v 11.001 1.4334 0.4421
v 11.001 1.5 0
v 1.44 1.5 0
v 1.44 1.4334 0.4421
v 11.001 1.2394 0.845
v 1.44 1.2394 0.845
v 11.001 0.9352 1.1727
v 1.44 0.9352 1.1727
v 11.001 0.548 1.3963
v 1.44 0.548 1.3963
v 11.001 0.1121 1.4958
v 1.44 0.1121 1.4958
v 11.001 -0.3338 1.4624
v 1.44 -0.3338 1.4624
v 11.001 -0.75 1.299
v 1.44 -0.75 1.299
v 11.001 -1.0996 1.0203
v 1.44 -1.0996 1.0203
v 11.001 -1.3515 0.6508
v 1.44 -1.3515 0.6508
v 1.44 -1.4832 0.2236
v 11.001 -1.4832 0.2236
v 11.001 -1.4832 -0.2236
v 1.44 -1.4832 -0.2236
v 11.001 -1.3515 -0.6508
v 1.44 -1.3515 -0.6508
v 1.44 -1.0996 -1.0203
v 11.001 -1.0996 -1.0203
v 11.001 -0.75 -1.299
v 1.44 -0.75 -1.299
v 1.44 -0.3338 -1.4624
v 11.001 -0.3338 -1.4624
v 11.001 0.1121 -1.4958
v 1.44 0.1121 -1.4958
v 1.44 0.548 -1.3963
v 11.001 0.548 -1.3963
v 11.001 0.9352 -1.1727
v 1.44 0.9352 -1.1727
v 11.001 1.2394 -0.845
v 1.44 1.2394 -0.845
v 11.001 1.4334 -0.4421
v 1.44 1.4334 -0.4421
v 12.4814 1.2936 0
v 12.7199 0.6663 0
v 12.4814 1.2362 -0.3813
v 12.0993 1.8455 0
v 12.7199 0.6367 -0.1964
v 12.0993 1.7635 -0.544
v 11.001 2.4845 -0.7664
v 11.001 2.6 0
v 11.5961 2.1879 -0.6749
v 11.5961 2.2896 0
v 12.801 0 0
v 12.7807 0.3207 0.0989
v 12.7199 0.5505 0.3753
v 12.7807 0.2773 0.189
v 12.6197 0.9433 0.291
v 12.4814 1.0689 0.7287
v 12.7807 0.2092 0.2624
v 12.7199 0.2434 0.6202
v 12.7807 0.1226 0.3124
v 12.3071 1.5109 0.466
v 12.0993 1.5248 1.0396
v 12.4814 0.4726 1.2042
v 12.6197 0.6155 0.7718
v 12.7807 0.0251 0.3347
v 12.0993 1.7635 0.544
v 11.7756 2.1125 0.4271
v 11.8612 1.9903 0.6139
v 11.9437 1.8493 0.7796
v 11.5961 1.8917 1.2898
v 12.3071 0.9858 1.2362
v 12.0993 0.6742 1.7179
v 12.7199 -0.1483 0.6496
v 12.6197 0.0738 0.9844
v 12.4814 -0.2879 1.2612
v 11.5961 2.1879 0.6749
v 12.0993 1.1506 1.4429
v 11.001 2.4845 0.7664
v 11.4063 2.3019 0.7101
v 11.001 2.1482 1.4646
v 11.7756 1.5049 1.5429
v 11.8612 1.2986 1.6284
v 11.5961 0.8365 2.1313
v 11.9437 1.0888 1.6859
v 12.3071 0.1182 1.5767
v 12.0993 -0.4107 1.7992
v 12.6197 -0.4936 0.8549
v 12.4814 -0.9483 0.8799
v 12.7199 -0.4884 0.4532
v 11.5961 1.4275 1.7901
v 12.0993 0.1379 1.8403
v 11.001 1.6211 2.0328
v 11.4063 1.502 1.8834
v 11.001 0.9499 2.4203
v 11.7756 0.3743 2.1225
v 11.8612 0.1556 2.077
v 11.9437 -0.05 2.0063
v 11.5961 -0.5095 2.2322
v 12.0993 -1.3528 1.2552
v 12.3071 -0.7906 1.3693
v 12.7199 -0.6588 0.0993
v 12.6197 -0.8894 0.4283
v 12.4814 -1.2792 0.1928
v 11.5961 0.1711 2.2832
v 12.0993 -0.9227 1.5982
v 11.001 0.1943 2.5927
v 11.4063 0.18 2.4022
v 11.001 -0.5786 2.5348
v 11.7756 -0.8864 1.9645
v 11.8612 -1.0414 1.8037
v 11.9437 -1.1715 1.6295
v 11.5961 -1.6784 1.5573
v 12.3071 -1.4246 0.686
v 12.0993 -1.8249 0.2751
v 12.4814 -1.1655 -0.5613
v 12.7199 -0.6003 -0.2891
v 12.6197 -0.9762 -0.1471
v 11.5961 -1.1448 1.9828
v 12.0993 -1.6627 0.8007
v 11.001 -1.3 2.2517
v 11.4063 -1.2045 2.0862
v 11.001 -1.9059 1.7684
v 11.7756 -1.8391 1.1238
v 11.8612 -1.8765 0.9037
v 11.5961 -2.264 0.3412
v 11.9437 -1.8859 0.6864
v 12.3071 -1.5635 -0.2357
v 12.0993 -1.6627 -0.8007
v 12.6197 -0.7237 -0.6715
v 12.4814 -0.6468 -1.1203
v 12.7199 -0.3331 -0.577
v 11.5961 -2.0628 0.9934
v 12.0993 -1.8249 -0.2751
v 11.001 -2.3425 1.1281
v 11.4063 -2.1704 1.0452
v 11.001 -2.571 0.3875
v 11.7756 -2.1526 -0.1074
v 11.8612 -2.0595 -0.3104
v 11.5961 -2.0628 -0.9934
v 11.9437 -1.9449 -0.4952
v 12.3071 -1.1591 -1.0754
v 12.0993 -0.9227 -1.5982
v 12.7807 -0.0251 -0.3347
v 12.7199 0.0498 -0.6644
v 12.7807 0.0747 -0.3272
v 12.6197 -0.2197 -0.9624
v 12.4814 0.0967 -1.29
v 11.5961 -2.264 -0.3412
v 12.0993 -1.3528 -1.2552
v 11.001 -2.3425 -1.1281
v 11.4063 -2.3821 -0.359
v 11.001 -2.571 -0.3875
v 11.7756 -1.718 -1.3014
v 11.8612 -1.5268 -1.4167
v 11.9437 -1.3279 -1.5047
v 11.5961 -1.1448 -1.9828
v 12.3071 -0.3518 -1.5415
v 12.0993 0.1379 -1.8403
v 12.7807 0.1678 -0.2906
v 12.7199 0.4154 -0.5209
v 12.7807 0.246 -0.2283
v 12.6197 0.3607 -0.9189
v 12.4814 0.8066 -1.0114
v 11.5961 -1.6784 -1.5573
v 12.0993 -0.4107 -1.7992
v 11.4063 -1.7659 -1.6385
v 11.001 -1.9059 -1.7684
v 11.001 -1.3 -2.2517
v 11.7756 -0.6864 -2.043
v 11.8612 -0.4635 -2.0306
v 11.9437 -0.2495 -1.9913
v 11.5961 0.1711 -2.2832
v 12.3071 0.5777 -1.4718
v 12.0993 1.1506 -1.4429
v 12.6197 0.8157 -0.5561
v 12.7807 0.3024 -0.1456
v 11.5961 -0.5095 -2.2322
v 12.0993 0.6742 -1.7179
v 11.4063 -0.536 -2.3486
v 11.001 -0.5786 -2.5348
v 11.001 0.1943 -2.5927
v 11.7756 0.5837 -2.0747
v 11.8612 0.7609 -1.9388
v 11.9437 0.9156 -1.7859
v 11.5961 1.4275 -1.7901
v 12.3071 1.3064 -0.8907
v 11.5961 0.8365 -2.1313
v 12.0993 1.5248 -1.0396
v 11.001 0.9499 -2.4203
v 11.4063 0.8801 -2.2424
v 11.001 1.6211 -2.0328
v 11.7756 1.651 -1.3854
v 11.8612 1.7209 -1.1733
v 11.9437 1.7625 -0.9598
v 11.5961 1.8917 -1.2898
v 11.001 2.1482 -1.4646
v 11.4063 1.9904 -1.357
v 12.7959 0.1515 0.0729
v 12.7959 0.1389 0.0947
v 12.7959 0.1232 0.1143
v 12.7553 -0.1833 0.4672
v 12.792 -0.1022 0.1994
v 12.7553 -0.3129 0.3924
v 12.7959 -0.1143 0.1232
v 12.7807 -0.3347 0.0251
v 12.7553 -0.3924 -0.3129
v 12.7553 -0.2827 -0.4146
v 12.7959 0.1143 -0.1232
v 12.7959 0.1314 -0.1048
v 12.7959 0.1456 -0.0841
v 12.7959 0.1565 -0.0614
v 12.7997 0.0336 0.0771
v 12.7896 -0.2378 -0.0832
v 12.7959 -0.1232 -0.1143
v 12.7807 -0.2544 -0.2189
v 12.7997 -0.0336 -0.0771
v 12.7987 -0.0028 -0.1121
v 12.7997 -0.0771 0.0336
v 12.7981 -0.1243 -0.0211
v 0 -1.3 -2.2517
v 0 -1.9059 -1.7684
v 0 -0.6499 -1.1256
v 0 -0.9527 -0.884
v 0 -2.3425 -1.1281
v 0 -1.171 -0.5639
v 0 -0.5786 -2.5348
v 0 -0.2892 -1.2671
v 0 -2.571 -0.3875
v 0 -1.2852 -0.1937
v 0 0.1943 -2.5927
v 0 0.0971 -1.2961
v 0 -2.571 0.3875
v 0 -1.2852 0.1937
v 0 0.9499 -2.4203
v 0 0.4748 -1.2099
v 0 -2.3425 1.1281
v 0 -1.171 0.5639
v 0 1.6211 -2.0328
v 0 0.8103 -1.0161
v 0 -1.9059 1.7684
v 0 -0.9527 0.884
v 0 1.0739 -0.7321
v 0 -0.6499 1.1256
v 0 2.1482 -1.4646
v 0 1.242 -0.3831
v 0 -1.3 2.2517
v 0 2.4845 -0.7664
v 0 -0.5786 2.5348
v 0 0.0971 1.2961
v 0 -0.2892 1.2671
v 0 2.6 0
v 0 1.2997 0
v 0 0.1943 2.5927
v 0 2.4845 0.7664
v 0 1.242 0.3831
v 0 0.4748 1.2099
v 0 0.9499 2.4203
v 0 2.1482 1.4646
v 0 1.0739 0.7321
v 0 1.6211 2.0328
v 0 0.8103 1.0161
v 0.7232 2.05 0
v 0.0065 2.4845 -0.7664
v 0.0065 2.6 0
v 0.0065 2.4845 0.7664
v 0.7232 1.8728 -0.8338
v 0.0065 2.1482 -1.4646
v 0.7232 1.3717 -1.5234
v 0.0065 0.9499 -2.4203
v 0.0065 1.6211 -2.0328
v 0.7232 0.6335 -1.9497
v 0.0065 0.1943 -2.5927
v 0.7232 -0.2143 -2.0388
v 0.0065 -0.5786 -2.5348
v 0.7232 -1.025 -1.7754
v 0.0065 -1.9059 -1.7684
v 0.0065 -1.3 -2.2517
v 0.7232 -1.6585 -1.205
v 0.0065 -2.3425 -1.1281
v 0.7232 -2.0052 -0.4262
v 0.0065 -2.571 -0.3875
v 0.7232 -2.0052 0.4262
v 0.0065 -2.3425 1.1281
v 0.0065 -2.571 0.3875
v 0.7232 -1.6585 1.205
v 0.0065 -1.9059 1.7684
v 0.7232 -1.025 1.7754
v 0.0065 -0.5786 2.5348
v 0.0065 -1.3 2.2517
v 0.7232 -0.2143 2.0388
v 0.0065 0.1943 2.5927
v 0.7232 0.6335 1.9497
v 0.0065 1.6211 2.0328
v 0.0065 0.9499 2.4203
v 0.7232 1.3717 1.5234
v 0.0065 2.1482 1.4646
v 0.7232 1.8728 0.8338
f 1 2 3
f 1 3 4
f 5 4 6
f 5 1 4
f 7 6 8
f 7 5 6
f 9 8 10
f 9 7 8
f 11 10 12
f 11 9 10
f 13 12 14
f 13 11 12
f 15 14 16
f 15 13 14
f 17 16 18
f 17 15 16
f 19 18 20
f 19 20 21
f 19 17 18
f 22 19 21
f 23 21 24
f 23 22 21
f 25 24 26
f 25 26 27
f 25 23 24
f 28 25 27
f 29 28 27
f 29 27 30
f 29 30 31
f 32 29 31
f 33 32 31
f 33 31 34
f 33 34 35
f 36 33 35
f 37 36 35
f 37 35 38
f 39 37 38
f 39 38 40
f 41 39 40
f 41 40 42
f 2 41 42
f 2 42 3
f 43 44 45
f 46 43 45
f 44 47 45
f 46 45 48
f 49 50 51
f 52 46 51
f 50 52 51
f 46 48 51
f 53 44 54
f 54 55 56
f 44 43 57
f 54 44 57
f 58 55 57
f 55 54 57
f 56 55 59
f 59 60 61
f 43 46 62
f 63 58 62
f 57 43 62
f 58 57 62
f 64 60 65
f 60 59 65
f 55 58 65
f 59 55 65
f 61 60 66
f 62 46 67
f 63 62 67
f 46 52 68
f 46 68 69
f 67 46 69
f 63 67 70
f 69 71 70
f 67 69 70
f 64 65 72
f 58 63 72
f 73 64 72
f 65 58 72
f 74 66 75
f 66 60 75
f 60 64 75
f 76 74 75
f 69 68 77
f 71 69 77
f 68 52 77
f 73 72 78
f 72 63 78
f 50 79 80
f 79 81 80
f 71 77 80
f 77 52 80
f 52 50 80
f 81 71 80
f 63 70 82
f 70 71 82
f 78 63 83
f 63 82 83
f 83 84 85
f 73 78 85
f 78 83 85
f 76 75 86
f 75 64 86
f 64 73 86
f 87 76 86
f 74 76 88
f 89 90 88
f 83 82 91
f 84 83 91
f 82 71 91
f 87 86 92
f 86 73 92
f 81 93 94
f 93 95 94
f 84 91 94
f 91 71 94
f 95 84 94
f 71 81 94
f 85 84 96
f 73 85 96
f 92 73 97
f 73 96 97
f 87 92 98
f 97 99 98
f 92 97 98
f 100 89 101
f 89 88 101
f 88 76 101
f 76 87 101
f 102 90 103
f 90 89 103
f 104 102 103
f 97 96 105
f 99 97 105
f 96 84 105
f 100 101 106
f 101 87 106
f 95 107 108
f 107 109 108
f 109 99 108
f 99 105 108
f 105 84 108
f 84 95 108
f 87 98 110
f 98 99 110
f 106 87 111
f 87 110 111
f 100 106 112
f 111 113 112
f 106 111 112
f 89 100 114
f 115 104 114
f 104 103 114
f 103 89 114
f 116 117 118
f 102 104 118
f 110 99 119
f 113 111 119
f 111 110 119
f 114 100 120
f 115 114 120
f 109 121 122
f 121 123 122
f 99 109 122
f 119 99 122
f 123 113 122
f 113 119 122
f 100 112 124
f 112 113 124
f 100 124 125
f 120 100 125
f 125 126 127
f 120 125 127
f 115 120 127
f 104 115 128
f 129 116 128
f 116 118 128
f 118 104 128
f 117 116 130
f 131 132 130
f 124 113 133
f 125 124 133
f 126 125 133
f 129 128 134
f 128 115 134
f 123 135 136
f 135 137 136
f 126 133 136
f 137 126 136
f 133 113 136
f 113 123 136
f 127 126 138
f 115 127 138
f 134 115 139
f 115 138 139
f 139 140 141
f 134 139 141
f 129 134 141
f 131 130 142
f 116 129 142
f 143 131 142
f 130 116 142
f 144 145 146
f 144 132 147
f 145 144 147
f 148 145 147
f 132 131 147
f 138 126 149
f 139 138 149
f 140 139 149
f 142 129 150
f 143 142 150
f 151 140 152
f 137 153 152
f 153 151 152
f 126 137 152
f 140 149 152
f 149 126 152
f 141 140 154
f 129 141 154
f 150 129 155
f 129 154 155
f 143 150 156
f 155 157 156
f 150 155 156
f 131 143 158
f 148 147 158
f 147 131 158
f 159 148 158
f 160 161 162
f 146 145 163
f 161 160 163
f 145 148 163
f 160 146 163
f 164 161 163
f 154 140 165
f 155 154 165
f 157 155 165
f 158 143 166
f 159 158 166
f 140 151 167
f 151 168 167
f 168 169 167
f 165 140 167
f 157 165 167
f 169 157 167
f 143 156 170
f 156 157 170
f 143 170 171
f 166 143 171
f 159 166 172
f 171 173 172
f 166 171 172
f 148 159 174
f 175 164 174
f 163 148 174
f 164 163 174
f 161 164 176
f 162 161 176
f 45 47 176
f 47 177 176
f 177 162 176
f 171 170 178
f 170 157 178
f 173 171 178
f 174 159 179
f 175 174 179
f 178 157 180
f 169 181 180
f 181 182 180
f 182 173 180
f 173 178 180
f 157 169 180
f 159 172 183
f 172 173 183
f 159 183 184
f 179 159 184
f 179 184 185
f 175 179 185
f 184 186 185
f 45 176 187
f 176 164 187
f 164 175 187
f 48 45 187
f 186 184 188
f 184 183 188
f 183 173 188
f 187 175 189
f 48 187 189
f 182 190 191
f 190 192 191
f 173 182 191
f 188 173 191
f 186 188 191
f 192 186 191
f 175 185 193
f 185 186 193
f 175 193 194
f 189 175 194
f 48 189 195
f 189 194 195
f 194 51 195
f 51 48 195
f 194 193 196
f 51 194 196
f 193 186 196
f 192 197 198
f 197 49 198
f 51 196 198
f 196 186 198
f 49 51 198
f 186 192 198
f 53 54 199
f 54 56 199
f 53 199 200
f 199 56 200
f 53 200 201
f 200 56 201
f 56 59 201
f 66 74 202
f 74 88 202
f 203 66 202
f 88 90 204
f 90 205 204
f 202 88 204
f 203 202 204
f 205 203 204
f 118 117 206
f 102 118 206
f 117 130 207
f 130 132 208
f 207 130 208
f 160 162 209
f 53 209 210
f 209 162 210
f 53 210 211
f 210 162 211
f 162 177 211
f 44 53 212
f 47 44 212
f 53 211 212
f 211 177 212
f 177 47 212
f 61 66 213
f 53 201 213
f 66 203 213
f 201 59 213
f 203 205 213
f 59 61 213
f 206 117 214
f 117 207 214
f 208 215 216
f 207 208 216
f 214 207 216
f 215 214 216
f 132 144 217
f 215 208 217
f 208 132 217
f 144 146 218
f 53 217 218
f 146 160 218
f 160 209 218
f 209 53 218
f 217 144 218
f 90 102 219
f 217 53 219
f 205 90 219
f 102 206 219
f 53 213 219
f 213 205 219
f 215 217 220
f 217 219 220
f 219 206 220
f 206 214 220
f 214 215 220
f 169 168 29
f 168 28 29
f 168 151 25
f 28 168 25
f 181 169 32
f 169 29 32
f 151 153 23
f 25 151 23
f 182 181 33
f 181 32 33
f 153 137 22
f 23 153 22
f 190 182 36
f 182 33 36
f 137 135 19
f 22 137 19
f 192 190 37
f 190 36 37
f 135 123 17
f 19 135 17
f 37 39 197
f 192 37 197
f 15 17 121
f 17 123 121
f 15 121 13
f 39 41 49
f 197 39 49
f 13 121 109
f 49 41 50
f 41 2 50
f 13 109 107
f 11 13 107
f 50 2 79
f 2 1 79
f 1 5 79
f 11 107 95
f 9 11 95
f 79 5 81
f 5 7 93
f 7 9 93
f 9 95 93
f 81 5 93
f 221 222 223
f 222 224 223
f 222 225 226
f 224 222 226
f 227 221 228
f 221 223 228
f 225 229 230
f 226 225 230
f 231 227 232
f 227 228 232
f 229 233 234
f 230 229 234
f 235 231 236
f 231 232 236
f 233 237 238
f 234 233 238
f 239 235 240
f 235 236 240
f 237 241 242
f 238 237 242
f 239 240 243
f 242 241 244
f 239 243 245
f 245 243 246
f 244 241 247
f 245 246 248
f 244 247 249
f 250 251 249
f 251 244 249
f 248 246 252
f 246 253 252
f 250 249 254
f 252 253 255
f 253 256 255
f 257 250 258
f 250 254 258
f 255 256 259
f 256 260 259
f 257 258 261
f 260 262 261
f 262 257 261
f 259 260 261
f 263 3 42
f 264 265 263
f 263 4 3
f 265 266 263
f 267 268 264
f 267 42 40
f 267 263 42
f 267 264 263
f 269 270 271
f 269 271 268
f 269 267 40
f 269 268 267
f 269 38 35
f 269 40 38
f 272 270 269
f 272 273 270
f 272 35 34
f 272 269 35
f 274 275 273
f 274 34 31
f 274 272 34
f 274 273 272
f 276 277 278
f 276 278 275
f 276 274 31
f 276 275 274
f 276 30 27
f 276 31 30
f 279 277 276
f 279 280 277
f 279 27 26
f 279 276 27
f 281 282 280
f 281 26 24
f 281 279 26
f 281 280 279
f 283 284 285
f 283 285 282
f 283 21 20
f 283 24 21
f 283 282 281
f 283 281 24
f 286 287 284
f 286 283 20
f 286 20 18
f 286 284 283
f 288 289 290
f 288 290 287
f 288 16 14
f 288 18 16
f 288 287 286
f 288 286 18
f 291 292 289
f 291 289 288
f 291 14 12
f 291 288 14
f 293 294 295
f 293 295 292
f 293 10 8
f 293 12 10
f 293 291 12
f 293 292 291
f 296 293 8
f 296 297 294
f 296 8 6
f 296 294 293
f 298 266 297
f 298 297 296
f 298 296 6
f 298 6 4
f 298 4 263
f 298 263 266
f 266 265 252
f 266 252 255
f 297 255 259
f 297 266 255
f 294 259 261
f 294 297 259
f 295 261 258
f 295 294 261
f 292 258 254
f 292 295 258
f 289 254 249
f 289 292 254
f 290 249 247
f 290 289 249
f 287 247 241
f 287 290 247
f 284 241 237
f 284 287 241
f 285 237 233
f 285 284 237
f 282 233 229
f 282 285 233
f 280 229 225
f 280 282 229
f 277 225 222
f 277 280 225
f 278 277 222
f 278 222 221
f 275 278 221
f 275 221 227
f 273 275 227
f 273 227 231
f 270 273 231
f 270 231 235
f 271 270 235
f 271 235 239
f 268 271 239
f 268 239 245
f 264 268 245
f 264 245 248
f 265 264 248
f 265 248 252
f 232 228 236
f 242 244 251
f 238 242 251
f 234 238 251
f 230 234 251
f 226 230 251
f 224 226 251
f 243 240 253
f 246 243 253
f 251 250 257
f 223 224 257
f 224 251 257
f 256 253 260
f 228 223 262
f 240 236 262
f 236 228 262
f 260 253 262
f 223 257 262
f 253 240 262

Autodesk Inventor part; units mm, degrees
ref_plane "YZ Plane" through (0, 0, 0) normal (1, 0, 0) x (0, 1, 0)
ref_plane "XZ Plane" through (0, 0, 0) normal (0, 1, 0) x (-1, 0, 0)
ref_plane "XY Plane" through (0, 0, 0) normal (0, 0, 1) x (1, 0, 0)
sketch "Sketch" plane through (0, 0, 0) normal (0, 0, 1) x (1, 0, 0)
  line L0 (0, 0) -> (0, 2.6)
  line L1 (0, 2.6) -> (0.0065, 2.6)
  line L2 (0.0065, 2.6) -> (1.44, 1.5)
  line L3 (1.44, 1.5) -> (11.001, 1.5)
  line L4 (11.001, 1.5) -> (11.001, 2.6)
  line L5 (0, 0) -> (12.801, 0)
  arc A0 (12.801, 0) -> (11.001, 2.6) centre (10.0232, 0) ccw
  line L6 (-0.2879, 0) -> (1.7274, 0) projected
  line L7 (0, -0.2166) -> (0, 1.2997) projected
  dimension "d0" = 5.2
  dimension "d1" = 3
  dimension "d2" = 5.2
  dimension "d3" = 1.44
  dimension "d4" = 1.8
  dimension "d5" = 11.001
  dimension "d6" = 37.5
revolve "Body" add sketch "Sketch" angle 360 about axis through (0, 0, 0) along (1, 0, 0)
equation "\"d0\" = KOD"
equation "\"d1\" = NND1"
equation "\"d2\" = KOD1"
equation "\"d3\" = KOH"
equation "\"d4\" = KOH1"
equation "\"d6\" = 0.5 * SEWI"
equation "\"KLG\" = 11"
equation "\"NND1\" = 3"
equation "\"KOH\" = 1.44"
equation "\"KOD\" = 5.2"
equation "\"SEWI\" = 75deg"
equation "\"KOH1\" = 1.8"
equation "\"KOD1\" = 5.2"
equation "\"NLG\" = 16"
equation "\"KLGMIN\" = 1.8"
equation "\"NND\" = 3"
equation "\"KLGMAX\" = 11"
properties part number "DIN 661 - A 3 x 16" material "Steel, Mild"
